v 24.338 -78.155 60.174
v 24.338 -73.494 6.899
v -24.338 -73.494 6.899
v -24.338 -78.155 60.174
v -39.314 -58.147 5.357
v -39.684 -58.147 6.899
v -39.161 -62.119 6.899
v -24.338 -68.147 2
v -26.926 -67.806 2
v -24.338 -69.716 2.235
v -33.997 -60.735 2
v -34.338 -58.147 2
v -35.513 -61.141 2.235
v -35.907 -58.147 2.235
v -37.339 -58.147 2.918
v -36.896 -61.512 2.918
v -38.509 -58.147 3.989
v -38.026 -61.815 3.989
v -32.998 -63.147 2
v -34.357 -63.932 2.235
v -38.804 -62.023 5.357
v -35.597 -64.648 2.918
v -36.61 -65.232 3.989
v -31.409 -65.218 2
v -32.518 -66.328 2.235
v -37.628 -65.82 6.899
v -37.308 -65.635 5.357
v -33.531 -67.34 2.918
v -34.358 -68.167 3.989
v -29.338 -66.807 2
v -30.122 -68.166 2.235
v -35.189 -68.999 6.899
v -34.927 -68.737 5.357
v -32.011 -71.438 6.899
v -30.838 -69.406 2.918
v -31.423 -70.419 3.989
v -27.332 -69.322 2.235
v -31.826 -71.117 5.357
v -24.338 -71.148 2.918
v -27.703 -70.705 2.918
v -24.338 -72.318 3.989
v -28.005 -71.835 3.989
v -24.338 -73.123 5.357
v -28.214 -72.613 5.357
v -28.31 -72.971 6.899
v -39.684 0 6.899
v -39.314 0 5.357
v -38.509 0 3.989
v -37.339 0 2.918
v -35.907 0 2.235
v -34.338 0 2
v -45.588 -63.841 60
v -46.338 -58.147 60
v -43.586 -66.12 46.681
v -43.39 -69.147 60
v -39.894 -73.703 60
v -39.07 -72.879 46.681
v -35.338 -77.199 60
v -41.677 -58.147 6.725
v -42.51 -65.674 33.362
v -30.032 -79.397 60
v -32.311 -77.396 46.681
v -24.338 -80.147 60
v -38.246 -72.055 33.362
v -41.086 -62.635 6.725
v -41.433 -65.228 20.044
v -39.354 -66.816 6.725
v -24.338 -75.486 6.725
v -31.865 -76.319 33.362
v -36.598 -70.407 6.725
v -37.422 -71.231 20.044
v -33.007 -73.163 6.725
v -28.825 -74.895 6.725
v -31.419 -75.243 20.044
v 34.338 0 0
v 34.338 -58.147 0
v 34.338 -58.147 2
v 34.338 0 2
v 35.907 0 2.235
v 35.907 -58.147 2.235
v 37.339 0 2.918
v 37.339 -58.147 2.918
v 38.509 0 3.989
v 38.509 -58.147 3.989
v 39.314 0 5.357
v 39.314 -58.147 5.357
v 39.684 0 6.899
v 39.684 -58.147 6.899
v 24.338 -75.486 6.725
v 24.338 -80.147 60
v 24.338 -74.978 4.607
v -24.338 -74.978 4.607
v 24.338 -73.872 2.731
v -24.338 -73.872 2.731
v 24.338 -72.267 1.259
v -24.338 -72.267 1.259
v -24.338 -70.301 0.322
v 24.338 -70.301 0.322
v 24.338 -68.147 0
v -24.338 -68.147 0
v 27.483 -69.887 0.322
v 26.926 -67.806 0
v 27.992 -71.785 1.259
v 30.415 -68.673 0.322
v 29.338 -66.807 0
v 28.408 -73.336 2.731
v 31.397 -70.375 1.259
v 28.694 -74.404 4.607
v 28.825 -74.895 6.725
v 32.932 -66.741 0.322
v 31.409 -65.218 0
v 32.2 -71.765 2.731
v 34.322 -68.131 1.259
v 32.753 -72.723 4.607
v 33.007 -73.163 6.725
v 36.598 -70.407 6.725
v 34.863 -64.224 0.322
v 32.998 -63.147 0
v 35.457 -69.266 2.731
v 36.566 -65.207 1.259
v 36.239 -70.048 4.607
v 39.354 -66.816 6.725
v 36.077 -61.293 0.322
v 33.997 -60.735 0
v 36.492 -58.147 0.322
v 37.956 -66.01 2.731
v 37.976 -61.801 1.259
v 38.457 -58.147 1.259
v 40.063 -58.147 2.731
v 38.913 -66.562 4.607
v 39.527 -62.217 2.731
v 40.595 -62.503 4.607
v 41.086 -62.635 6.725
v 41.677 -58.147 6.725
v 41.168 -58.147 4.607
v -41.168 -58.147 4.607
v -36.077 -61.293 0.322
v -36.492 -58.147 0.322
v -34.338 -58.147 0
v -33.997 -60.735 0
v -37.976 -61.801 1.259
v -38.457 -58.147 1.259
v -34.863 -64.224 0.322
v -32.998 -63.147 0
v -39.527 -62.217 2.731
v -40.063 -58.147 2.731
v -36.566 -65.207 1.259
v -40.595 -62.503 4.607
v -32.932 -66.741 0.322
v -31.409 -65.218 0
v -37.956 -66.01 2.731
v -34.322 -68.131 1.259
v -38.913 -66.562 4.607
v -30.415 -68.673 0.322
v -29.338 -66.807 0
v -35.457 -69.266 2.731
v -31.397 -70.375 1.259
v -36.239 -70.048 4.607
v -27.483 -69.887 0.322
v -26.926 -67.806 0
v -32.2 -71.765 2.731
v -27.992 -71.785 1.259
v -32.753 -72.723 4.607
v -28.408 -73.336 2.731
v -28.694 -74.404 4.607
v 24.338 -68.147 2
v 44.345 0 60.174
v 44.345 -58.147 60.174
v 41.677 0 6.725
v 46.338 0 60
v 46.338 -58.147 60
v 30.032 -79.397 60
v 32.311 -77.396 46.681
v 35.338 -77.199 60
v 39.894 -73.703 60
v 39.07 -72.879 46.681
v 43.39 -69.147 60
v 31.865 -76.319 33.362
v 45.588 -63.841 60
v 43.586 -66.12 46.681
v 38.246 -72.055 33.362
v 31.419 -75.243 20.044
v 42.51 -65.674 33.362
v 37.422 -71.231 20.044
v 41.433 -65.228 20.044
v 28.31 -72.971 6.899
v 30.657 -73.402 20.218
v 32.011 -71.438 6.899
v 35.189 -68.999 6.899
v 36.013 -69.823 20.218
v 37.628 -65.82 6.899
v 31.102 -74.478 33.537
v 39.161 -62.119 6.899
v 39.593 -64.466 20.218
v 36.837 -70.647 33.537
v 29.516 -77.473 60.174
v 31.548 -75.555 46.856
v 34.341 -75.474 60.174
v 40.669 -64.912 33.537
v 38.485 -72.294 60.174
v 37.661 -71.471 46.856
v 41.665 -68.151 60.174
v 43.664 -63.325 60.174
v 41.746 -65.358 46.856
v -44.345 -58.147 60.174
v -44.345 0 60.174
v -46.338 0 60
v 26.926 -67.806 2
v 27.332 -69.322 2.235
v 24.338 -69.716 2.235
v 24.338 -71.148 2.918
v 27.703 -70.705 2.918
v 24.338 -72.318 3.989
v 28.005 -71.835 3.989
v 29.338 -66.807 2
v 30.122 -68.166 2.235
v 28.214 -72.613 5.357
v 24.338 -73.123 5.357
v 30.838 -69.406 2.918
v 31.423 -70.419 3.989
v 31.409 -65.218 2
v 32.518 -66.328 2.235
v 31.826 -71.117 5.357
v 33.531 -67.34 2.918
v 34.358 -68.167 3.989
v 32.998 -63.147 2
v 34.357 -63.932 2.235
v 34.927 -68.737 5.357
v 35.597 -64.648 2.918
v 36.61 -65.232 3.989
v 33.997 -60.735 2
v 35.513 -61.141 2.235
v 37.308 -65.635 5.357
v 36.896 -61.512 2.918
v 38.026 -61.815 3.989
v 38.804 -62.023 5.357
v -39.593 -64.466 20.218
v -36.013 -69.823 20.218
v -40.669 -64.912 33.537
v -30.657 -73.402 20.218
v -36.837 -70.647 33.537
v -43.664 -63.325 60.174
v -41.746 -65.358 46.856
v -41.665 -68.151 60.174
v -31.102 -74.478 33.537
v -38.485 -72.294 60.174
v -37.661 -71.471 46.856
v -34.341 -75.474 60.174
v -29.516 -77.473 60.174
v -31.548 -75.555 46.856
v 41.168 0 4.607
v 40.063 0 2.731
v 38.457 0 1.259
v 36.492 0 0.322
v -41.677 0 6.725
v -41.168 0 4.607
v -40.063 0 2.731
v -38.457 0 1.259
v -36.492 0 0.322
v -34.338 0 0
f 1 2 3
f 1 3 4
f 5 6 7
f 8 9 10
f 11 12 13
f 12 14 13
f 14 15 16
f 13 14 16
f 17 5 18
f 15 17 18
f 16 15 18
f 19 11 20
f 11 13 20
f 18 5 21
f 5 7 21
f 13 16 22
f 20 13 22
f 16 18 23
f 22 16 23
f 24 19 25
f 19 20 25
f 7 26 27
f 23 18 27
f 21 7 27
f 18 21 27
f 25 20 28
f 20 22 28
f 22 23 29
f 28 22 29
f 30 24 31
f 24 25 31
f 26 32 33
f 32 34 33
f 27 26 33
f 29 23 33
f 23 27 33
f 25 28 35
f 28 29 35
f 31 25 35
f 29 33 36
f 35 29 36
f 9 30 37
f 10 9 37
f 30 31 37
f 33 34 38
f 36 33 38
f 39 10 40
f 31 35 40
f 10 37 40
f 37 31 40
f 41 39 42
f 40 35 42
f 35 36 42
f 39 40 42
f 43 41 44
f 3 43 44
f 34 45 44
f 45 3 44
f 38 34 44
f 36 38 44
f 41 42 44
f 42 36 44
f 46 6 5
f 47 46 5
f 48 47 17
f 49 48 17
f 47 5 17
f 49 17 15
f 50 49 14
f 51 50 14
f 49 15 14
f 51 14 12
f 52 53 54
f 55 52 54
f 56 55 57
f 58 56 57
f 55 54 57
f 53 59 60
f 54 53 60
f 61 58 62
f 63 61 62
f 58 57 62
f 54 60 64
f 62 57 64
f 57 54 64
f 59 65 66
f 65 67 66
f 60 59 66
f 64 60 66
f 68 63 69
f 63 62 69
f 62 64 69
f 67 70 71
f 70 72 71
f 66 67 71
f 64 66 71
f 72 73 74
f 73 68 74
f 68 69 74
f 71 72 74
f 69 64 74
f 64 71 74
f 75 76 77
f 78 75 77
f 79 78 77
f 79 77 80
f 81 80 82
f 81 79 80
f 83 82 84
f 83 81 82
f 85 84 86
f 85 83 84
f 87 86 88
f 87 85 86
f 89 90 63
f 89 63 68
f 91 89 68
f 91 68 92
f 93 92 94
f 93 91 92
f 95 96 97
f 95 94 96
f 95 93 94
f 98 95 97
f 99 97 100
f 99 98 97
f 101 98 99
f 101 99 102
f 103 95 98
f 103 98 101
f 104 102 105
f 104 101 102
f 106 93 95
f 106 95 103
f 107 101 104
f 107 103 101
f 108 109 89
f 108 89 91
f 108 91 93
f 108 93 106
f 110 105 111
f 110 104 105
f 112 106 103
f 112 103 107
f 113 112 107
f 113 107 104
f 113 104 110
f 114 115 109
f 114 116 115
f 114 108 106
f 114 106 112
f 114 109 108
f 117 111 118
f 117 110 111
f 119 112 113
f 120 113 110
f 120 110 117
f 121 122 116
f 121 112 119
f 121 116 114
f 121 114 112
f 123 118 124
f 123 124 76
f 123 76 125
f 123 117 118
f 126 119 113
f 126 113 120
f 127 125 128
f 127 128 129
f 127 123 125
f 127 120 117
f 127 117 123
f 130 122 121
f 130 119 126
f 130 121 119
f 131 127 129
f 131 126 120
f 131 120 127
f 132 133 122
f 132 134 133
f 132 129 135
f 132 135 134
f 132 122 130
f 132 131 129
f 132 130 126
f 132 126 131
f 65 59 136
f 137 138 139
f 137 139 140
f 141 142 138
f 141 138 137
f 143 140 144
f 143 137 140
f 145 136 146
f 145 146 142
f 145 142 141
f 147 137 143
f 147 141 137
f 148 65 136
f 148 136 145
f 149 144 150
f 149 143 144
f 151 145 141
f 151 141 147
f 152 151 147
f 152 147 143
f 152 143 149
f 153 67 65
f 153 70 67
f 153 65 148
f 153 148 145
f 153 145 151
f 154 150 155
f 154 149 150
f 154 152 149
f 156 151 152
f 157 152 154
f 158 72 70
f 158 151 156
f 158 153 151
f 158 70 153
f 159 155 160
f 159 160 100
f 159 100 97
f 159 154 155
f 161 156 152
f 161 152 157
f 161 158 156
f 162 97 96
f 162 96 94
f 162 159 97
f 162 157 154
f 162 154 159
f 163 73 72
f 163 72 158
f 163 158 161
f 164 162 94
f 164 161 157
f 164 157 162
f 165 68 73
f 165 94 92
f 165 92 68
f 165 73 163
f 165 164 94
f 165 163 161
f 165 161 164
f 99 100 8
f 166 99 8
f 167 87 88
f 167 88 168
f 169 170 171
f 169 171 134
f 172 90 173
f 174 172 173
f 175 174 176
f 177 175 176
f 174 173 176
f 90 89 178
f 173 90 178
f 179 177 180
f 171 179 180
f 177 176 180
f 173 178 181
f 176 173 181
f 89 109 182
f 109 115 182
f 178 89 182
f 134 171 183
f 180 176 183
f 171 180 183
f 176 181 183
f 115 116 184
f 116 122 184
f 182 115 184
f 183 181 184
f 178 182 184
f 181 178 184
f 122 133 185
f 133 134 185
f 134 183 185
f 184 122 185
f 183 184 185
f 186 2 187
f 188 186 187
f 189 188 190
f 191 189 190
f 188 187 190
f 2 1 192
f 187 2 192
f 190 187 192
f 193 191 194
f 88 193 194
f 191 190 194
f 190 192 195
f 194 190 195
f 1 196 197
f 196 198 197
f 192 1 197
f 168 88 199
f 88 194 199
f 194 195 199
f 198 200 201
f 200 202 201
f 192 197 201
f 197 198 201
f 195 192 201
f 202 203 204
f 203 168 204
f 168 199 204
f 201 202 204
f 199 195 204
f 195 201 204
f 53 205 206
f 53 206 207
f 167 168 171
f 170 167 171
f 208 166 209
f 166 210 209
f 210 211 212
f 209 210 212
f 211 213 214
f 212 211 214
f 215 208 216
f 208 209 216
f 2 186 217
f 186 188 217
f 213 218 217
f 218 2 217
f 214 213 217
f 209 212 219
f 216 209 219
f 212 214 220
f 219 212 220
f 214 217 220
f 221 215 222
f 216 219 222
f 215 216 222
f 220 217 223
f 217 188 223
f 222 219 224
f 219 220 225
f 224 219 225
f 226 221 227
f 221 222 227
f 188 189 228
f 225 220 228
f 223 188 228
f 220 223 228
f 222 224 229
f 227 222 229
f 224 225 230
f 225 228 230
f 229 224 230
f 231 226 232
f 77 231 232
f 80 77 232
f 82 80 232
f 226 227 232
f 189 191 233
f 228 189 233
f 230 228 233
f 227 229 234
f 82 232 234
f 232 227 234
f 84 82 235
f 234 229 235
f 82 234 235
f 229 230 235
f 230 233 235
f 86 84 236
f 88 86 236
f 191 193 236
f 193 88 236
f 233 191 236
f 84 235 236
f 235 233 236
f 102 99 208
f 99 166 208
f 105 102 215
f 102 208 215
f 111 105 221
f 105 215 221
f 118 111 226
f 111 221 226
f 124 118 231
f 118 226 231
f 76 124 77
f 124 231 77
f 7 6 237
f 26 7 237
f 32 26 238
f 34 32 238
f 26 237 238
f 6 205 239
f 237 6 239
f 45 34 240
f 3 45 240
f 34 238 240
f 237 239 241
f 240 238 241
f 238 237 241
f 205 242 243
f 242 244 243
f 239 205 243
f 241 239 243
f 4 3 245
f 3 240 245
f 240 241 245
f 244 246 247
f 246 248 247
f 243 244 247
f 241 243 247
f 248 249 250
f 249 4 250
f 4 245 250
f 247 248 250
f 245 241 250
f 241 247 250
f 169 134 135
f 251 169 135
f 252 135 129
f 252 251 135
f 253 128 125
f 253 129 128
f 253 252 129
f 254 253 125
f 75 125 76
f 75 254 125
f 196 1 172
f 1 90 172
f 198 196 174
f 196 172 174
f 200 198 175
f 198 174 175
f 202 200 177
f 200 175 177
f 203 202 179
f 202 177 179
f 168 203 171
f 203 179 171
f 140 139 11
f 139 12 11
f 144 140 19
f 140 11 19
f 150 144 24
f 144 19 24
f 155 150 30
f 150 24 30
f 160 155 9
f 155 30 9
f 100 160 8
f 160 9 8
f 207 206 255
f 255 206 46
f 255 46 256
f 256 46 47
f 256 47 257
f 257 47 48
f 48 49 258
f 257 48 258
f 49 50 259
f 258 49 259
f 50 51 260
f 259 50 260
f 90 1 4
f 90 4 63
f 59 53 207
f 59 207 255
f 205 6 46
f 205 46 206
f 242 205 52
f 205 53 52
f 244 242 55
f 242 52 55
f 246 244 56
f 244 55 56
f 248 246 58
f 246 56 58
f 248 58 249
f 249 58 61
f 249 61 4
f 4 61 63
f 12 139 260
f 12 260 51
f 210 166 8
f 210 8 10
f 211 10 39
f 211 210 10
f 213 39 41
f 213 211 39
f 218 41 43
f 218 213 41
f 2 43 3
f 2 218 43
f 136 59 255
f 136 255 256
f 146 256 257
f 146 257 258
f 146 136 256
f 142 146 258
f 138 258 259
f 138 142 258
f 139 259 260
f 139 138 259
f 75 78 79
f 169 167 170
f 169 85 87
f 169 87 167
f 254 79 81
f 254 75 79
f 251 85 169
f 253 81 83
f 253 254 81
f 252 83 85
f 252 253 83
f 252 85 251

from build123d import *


with BuildPart() as f4:
    # F4: sweep along a path in F2
    with BuildLine(Plane.XY.offset(60)) as f4_path:
        Line((-46.337677, 0), (-46.337677, -58.146937))
        ThreePointArc((-46.337677, -58.146937), (-39.894026, -73.703286), (-24.337677, -80.146937))
        Line((-24.337677, -80.146937), (24.337677, -80.146937))
        ThreePointArc((24.337677, -80.146937), (39.894026, -73.703286), (46.337677, -58.146937))
        Line((46.337677, -58.146937), (46.337677, 0))
    # F3 (on Front) → F4 (sweep)
    with BuildSketch(Plane.XZ):
        with BuildLine():
            Line((-44.345288, 60.174311), (-46.337677, 60))
            Line((-46.337677, 60), (-41.676718, 6.724992))
            ThreePointArc((-41.676718, 6.724992), (-39.314801, 1.935497), (-34.337677, 0))
            Line((-34.337677, 0), (-34.337677, 2))
            ThreePointArc((-34.337677, 2), (-37.96362, 3.410052), (-39.684328, 6.899303))
            Line((-39.684328, 6.899303), (-44.345288, 60.174311))
        make_face()
    sweep(path=f4_path.line)


solid = f4.part
